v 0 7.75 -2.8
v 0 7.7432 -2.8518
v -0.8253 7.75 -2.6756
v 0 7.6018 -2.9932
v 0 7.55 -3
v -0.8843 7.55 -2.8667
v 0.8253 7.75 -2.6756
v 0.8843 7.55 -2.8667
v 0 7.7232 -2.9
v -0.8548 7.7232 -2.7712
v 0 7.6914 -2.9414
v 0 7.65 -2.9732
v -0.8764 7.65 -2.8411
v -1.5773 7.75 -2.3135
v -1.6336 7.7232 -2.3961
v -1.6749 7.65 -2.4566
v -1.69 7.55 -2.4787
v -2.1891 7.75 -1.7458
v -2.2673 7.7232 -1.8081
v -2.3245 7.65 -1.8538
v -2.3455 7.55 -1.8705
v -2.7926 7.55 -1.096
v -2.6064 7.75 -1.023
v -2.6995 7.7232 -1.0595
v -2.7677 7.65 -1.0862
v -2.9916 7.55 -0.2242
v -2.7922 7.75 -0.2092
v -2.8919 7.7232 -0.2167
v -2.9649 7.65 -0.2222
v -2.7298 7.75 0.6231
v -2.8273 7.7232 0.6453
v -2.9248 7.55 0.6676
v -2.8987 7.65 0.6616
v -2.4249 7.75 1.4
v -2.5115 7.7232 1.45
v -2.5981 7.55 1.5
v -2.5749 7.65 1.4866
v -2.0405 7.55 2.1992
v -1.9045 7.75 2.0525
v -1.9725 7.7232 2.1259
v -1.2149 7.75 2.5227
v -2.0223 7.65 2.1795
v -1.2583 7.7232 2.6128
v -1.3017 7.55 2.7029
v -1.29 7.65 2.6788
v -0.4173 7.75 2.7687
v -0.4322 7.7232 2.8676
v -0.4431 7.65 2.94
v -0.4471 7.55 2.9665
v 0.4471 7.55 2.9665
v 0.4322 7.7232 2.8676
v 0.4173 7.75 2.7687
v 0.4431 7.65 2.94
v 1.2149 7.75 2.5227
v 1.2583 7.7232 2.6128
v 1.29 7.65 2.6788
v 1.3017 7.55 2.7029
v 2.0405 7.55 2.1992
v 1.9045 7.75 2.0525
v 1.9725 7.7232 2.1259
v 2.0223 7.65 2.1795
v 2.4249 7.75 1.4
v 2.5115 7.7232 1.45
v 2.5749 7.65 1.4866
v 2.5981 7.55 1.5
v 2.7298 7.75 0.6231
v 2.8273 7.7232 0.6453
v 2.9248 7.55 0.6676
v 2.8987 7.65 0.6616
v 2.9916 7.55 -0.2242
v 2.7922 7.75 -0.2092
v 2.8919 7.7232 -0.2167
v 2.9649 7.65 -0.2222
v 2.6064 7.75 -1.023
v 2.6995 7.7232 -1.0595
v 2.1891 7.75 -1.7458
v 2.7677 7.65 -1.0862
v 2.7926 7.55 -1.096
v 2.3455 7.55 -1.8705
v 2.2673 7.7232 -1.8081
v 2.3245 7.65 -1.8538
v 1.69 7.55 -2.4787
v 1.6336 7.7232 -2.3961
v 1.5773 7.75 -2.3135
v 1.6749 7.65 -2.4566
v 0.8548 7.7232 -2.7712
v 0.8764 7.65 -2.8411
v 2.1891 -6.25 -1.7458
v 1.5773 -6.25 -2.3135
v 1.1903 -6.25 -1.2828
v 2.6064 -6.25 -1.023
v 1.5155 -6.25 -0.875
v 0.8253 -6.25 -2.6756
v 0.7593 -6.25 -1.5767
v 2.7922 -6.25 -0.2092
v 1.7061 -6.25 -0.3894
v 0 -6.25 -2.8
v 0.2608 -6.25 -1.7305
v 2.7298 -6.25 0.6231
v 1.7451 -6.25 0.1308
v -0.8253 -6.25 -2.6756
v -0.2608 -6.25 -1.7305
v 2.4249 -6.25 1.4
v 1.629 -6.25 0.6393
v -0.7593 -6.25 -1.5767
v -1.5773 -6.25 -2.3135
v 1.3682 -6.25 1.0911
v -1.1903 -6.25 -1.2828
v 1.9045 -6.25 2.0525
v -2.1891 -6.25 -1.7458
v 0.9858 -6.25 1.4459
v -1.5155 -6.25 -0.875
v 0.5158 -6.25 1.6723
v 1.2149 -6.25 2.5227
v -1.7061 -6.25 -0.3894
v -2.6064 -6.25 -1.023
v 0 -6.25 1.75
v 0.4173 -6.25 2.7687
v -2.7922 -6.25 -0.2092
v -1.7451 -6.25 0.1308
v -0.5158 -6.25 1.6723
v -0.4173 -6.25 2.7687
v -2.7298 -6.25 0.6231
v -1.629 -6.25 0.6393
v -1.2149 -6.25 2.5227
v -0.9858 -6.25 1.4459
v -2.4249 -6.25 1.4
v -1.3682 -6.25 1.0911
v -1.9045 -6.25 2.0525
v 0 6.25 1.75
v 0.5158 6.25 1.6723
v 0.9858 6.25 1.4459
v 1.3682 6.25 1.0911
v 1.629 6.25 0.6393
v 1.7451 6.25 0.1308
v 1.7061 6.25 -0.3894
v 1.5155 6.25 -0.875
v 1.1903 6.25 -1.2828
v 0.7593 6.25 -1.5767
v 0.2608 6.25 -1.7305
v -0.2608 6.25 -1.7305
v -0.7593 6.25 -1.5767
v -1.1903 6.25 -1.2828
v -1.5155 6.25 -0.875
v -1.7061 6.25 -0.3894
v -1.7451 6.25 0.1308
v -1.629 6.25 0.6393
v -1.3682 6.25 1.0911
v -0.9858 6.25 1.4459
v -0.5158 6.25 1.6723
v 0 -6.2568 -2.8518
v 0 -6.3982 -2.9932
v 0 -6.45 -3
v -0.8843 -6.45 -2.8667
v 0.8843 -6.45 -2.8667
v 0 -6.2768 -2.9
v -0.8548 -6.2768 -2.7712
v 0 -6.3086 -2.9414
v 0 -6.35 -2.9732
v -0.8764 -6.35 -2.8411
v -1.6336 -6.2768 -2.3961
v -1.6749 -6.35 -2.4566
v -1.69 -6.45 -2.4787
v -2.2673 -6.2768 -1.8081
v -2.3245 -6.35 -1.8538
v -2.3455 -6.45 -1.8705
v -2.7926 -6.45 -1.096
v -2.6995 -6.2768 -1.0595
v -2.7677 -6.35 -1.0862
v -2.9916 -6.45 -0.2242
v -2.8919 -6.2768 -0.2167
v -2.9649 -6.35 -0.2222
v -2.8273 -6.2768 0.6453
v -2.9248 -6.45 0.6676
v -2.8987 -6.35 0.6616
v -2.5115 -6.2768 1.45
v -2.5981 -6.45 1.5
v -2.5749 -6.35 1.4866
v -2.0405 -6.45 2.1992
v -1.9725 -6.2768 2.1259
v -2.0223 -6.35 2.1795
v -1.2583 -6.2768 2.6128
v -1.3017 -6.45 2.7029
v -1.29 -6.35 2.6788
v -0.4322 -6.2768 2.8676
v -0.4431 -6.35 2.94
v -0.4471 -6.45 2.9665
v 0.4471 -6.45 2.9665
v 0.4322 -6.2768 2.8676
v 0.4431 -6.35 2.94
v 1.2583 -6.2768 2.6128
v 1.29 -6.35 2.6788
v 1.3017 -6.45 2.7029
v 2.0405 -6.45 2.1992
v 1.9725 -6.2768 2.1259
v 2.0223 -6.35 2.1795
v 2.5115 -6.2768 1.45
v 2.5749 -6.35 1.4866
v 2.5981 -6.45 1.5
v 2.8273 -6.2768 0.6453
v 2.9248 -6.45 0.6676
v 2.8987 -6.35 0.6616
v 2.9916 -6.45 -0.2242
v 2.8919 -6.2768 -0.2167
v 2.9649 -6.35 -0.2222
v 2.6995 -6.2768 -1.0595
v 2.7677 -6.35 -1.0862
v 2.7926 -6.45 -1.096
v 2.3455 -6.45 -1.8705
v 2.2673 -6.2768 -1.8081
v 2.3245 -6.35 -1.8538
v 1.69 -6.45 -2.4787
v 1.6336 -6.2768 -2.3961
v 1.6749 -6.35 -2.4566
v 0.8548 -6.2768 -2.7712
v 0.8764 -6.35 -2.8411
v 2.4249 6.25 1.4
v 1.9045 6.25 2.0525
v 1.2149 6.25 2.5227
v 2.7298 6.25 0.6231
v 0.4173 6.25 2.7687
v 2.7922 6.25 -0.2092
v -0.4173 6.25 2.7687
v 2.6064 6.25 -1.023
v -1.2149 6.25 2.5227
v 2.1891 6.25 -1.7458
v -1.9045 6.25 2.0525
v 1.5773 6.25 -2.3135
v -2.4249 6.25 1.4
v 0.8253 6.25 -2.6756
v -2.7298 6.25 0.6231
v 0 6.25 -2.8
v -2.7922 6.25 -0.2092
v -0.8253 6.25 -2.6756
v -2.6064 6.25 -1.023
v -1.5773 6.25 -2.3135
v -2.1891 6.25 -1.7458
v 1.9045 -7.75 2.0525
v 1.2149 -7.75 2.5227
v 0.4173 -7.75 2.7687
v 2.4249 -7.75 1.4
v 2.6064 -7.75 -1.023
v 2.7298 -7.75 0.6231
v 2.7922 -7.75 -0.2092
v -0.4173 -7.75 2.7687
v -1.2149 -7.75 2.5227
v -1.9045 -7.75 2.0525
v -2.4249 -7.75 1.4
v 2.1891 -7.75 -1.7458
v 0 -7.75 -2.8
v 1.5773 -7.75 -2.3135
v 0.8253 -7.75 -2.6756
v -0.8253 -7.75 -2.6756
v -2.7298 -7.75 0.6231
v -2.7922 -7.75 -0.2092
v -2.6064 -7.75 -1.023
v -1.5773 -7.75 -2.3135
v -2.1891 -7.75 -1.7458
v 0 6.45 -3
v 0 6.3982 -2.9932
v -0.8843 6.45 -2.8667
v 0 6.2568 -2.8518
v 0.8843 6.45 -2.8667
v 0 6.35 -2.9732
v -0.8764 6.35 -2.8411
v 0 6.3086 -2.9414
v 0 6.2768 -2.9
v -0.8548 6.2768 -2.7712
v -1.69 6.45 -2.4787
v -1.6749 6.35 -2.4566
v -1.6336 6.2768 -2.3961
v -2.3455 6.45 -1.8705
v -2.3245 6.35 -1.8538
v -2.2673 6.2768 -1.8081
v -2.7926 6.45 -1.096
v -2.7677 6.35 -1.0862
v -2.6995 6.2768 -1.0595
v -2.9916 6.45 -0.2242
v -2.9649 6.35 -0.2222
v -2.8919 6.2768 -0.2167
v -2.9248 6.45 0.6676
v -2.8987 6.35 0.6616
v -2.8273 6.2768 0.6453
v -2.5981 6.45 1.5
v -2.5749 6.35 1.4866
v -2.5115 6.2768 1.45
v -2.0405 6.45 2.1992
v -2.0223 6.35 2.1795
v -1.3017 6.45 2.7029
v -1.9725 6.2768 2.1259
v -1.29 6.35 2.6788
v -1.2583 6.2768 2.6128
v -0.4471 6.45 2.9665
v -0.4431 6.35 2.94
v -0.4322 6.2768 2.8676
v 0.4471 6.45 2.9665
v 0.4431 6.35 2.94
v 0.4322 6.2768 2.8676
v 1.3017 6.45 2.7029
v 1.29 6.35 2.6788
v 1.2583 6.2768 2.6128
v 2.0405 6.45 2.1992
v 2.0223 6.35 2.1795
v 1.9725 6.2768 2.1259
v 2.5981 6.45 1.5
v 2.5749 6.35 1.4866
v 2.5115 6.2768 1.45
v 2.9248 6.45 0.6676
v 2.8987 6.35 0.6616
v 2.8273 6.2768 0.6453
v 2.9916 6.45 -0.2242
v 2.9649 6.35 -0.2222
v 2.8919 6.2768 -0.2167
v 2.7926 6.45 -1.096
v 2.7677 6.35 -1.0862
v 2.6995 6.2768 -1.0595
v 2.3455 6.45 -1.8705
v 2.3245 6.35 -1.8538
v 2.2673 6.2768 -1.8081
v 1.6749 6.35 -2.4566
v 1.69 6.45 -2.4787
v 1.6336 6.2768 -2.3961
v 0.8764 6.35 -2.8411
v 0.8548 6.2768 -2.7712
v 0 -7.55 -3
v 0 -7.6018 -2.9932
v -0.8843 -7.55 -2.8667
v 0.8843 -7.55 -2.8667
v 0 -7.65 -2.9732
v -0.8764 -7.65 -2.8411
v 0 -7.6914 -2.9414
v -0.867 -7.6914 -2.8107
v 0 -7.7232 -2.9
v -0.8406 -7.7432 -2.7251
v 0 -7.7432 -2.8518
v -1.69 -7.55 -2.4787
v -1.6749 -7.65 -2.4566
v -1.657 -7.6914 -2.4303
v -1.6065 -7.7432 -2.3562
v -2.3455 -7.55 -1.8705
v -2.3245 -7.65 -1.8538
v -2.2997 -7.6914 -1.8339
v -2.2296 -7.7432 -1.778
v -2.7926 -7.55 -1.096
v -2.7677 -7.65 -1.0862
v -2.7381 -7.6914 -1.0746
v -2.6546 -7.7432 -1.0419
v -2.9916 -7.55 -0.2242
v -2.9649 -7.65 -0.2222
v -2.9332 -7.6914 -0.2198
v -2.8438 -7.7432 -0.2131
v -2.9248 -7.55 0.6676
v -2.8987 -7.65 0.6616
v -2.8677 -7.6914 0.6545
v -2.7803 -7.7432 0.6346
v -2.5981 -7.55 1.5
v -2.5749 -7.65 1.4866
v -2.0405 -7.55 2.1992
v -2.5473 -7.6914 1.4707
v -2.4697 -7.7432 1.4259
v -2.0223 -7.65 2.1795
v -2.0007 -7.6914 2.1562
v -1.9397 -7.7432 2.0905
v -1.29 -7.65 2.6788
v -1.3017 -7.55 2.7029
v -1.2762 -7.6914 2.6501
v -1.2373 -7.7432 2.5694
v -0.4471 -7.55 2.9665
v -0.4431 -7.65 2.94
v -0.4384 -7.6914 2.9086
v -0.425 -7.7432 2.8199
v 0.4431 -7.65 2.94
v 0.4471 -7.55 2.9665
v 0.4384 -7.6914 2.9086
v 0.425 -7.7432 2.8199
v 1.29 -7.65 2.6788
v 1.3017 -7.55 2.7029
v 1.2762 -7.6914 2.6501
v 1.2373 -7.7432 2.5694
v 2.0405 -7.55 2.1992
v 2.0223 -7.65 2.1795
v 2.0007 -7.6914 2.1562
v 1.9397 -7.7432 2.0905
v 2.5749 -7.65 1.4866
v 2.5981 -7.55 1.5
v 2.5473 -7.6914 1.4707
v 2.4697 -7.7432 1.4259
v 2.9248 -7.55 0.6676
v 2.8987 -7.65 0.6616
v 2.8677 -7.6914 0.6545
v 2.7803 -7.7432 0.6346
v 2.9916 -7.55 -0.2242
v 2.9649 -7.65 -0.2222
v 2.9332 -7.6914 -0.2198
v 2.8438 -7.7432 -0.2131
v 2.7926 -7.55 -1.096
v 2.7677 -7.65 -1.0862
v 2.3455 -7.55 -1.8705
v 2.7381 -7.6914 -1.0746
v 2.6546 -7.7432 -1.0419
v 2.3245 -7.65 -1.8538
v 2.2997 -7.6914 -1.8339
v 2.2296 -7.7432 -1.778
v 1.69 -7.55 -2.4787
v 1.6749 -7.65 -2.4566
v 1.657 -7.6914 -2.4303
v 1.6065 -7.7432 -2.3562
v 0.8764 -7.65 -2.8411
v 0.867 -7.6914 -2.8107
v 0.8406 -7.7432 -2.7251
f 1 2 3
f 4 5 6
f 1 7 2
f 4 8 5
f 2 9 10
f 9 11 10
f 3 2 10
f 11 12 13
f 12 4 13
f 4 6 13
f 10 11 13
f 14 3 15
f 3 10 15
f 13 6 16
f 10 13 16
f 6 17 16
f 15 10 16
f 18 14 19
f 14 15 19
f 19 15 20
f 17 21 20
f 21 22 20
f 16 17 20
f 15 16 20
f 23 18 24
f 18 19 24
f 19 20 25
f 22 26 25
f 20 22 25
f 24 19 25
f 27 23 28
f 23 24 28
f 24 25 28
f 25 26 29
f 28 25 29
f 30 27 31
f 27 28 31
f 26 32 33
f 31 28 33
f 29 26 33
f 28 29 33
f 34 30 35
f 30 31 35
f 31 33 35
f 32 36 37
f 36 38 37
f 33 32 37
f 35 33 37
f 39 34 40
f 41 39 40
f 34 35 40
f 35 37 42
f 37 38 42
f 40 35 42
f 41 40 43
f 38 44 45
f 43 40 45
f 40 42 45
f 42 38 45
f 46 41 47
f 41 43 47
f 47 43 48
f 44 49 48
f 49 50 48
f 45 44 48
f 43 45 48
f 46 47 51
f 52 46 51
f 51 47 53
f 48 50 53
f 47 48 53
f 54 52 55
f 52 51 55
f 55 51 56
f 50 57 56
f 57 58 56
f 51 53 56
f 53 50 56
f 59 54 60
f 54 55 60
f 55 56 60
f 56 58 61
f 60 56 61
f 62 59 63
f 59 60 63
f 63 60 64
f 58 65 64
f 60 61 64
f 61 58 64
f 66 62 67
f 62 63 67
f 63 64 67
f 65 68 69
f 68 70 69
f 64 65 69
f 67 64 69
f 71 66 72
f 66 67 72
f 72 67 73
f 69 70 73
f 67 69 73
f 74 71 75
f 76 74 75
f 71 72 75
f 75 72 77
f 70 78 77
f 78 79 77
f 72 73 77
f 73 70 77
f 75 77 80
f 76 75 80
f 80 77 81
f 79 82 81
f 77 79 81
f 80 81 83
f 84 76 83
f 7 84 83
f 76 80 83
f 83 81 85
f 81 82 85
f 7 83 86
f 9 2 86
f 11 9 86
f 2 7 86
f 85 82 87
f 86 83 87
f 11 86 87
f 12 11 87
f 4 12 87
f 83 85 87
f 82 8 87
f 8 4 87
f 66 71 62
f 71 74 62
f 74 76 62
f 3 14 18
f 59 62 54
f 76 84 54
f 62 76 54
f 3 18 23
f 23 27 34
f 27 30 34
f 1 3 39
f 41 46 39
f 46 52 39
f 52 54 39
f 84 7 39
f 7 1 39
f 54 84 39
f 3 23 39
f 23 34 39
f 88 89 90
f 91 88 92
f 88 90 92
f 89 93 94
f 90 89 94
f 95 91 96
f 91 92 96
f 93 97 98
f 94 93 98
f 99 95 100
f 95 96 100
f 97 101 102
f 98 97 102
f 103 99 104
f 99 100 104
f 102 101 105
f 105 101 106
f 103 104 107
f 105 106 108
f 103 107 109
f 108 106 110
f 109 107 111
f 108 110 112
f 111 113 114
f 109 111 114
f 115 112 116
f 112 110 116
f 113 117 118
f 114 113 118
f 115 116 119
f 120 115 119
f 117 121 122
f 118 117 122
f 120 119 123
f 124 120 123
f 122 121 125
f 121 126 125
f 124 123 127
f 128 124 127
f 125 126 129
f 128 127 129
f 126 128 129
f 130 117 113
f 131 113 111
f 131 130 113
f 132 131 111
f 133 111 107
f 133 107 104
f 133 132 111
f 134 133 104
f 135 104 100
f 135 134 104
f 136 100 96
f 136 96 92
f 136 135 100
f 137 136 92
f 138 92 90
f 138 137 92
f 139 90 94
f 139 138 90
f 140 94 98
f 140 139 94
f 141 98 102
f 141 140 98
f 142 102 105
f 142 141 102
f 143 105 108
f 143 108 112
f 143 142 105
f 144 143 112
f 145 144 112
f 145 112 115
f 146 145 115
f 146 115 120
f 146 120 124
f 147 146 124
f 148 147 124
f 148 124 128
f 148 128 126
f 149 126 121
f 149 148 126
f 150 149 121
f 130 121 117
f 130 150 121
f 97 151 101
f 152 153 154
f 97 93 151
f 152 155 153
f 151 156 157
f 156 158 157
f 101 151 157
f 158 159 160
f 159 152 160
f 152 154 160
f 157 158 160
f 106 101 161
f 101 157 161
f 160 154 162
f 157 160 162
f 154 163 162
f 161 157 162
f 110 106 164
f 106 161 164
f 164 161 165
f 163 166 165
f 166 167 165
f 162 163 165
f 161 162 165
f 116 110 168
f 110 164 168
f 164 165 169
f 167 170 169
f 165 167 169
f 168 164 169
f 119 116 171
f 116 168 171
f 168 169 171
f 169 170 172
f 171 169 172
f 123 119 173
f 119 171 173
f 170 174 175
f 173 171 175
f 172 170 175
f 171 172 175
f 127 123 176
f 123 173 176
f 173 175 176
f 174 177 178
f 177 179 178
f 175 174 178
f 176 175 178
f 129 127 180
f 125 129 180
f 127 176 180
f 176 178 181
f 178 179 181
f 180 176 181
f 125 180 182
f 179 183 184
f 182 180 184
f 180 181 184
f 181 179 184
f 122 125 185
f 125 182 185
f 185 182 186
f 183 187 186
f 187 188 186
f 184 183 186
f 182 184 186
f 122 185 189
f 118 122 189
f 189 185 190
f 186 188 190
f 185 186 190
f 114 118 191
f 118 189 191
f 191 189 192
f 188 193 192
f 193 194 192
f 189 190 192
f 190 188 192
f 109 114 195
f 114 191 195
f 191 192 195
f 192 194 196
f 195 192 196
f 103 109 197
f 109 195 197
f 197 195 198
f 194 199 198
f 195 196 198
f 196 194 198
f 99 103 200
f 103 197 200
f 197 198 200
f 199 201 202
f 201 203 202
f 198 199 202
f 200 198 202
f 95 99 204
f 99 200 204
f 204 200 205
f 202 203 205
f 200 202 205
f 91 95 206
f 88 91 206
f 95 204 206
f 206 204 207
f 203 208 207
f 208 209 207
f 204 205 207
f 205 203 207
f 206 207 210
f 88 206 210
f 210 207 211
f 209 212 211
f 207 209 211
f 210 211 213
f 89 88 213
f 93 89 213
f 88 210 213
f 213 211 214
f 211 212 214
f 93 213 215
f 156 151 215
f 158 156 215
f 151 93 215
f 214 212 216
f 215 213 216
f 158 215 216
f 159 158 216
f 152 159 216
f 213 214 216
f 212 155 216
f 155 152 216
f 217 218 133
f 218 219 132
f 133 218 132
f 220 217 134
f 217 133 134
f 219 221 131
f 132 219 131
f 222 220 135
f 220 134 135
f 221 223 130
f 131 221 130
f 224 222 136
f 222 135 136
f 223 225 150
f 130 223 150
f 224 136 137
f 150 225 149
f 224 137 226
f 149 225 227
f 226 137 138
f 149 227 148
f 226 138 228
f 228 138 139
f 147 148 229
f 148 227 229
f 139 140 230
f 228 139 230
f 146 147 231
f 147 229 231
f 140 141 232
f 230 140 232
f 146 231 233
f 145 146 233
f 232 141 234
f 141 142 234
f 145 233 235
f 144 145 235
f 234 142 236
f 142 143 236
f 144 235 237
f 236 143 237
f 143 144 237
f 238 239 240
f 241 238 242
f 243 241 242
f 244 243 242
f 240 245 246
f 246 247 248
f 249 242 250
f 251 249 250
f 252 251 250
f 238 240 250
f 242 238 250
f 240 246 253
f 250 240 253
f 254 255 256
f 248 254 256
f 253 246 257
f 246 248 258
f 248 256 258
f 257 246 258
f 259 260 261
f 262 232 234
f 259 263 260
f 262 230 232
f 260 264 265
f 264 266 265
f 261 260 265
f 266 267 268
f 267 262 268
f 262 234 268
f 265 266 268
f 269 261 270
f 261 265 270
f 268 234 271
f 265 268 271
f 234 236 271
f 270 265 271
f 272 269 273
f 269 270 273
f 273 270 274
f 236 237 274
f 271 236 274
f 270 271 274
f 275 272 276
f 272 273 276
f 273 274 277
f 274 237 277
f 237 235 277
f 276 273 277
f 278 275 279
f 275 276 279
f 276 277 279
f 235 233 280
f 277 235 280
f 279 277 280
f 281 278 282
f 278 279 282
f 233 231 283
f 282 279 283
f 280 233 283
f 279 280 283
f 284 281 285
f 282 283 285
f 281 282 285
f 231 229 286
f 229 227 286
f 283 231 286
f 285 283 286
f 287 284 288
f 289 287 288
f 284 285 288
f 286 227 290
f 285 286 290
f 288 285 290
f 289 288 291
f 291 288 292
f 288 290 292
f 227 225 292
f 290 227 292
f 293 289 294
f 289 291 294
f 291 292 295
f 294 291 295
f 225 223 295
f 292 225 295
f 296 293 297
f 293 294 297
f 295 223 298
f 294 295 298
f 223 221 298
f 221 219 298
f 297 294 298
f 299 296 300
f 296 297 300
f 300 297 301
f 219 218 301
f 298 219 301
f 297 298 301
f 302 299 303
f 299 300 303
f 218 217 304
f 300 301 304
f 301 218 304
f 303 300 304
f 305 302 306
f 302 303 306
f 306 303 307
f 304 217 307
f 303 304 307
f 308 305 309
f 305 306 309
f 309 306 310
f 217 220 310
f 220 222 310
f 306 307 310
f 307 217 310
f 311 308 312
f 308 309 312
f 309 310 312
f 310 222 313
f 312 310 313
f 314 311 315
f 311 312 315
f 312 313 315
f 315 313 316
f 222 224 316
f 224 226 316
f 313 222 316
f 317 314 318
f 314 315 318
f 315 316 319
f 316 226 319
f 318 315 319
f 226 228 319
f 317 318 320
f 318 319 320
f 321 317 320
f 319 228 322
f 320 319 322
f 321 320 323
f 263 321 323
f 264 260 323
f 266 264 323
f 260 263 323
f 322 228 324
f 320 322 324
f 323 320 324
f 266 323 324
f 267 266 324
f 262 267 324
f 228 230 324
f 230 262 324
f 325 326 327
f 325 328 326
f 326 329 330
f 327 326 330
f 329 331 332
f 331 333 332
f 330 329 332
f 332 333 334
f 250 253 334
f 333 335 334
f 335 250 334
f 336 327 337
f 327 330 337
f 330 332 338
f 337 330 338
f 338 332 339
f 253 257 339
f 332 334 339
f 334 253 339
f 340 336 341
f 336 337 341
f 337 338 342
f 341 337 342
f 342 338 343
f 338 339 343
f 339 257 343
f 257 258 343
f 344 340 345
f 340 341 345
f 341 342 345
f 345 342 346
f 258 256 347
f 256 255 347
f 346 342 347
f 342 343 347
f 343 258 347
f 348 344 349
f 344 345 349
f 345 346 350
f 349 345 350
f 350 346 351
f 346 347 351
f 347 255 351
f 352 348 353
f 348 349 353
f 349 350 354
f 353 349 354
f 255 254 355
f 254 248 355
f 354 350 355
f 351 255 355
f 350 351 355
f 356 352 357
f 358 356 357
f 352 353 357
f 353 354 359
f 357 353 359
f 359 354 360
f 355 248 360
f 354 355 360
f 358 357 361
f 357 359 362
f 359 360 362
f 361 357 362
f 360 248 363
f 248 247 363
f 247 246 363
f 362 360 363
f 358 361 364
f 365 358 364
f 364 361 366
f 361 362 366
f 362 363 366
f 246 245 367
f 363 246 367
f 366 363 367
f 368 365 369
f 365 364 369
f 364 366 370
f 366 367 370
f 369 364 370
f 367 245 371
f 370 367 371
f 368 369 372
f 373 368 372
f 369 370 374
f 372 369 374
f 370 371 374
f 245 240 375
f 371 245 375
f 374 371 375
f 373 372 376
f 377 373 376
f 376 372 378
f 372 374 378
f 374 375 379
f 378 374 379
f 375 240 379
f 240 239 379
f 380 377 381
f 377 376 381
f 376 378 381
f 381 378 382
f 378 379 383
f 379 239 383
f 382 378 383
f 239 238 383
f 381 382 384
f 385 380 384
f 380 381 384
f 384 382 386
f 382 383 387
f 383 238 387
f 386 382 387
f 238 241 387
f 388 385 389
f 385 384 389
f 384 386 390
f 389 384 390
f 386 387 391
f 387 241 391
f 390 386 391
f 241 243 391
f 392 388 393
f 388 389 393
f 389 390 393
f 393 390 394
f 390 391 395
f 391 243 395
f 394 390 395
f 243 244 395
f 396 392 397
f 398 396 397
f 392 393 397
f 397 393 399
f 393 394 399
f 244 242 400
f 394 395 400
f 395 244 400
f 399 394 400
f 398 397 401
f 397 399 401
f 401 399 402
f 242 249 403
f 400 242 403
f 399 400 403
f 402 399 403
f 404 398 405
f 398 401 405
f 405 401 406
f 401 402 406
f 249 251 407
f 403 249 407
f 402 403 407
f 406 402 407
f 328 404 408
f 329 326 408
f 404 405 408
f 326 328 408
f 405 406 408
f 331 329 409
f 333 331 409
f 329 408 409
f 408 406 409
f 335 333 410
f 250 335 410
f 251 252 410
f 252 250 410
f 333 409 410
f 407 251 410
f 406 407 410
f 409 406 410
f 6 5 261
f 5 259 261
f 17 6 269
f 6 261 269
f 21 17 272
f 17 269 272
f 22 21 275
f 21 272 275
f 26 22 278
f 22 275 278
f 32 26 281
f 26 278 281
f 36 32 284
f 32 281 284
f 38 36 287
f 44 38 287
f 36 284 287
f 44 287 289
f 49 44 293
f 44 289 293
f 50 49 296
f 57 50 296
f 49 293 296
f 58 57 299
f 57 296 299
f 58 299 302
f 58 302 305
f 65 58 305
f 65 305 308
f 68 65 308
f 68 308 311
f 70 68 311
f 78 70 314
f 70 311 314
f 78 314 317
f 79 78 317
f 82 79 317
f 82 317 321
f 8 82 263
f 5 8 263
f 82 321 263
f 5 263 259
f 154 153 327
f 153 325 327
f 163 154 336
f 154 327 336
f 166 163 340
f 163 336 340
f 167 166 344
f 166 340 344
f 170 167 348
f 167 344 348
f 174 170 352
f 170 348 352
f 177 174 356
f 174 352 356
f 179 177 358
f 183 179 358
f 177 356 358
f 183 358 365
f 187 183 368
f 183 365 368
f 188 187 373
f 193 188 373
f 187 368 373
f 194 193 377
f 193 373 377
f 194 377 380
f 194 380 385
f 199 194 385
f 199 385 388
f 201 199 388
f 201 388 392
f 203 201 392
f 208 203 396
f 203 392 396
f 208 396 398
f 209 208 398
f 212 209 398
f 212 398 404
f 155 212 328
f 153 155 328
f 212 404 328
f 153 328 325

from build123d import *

# Parameters (mm, degrees)
SKETCH1_R           = 1.75
BOSS_EXTRUDE1_DEPTH = 6.25


with BuildPart() as part:
    # Sketch1 → Boss-Extrude1 (new, symmetric)
    with BuildSketch(Plane(origin=(0, 0, 0), x_dir=(1, 0, 0), z_dir=(0, 1, 0))):
        with Locations(Location((0, 0, 0), (0, 0, 270))):
            Circle(SKETCH1_R)
    extrude(amount=BOSS_EXTRUDE1_DEPTH, both=True)

    # Sketch2 → Revolve1 (revolve)
    with BuildSketch(Plane.XY, mode=Mode.PRIVATE) as revolve1_sk:
        with BuildLine():
            Line((-2.8, 6.25), (0, 6.25))
            Line((0, 6.25), (0, 7.75))
            Line((0, 7.75), (-2.8, 7.75))
            ThreePointArc((-2.8, 7.75), (-2.941421356, 7.691421356), (-3, 7.55))
            Line((-3, 7.55), (-3, 6.45))
            ThreePointArc((-3, 6.45), (-2.941421356, 6.308578644), (-2.8, 6.25))
        make_face()
        with BuildLine():
            Line((-2.8, -7.75), (0, -7.75))
            Line((0, -7.75), (0, -6.25))
            Line((0, -6.25), (-2.8, -6.25))
            ThreePointArc((-2.8, -6.25), (-2.941421356, -6.308578644), (-3, -6.45))
            Line((-3, -6.45), (-3, -7.55))
            ThreePointArc((-3, -7.55), (-2.941421356, -7.691421356), (-2.8, -7.75))
        make_face()
    revolve(revolve1_sk.sketch.rotate(Axis((0, -7.75, 0), (0, 1, 0)), 270), axis=Axis((0, -7.75, 0), (0, 1, 0)))


solid = part.part
